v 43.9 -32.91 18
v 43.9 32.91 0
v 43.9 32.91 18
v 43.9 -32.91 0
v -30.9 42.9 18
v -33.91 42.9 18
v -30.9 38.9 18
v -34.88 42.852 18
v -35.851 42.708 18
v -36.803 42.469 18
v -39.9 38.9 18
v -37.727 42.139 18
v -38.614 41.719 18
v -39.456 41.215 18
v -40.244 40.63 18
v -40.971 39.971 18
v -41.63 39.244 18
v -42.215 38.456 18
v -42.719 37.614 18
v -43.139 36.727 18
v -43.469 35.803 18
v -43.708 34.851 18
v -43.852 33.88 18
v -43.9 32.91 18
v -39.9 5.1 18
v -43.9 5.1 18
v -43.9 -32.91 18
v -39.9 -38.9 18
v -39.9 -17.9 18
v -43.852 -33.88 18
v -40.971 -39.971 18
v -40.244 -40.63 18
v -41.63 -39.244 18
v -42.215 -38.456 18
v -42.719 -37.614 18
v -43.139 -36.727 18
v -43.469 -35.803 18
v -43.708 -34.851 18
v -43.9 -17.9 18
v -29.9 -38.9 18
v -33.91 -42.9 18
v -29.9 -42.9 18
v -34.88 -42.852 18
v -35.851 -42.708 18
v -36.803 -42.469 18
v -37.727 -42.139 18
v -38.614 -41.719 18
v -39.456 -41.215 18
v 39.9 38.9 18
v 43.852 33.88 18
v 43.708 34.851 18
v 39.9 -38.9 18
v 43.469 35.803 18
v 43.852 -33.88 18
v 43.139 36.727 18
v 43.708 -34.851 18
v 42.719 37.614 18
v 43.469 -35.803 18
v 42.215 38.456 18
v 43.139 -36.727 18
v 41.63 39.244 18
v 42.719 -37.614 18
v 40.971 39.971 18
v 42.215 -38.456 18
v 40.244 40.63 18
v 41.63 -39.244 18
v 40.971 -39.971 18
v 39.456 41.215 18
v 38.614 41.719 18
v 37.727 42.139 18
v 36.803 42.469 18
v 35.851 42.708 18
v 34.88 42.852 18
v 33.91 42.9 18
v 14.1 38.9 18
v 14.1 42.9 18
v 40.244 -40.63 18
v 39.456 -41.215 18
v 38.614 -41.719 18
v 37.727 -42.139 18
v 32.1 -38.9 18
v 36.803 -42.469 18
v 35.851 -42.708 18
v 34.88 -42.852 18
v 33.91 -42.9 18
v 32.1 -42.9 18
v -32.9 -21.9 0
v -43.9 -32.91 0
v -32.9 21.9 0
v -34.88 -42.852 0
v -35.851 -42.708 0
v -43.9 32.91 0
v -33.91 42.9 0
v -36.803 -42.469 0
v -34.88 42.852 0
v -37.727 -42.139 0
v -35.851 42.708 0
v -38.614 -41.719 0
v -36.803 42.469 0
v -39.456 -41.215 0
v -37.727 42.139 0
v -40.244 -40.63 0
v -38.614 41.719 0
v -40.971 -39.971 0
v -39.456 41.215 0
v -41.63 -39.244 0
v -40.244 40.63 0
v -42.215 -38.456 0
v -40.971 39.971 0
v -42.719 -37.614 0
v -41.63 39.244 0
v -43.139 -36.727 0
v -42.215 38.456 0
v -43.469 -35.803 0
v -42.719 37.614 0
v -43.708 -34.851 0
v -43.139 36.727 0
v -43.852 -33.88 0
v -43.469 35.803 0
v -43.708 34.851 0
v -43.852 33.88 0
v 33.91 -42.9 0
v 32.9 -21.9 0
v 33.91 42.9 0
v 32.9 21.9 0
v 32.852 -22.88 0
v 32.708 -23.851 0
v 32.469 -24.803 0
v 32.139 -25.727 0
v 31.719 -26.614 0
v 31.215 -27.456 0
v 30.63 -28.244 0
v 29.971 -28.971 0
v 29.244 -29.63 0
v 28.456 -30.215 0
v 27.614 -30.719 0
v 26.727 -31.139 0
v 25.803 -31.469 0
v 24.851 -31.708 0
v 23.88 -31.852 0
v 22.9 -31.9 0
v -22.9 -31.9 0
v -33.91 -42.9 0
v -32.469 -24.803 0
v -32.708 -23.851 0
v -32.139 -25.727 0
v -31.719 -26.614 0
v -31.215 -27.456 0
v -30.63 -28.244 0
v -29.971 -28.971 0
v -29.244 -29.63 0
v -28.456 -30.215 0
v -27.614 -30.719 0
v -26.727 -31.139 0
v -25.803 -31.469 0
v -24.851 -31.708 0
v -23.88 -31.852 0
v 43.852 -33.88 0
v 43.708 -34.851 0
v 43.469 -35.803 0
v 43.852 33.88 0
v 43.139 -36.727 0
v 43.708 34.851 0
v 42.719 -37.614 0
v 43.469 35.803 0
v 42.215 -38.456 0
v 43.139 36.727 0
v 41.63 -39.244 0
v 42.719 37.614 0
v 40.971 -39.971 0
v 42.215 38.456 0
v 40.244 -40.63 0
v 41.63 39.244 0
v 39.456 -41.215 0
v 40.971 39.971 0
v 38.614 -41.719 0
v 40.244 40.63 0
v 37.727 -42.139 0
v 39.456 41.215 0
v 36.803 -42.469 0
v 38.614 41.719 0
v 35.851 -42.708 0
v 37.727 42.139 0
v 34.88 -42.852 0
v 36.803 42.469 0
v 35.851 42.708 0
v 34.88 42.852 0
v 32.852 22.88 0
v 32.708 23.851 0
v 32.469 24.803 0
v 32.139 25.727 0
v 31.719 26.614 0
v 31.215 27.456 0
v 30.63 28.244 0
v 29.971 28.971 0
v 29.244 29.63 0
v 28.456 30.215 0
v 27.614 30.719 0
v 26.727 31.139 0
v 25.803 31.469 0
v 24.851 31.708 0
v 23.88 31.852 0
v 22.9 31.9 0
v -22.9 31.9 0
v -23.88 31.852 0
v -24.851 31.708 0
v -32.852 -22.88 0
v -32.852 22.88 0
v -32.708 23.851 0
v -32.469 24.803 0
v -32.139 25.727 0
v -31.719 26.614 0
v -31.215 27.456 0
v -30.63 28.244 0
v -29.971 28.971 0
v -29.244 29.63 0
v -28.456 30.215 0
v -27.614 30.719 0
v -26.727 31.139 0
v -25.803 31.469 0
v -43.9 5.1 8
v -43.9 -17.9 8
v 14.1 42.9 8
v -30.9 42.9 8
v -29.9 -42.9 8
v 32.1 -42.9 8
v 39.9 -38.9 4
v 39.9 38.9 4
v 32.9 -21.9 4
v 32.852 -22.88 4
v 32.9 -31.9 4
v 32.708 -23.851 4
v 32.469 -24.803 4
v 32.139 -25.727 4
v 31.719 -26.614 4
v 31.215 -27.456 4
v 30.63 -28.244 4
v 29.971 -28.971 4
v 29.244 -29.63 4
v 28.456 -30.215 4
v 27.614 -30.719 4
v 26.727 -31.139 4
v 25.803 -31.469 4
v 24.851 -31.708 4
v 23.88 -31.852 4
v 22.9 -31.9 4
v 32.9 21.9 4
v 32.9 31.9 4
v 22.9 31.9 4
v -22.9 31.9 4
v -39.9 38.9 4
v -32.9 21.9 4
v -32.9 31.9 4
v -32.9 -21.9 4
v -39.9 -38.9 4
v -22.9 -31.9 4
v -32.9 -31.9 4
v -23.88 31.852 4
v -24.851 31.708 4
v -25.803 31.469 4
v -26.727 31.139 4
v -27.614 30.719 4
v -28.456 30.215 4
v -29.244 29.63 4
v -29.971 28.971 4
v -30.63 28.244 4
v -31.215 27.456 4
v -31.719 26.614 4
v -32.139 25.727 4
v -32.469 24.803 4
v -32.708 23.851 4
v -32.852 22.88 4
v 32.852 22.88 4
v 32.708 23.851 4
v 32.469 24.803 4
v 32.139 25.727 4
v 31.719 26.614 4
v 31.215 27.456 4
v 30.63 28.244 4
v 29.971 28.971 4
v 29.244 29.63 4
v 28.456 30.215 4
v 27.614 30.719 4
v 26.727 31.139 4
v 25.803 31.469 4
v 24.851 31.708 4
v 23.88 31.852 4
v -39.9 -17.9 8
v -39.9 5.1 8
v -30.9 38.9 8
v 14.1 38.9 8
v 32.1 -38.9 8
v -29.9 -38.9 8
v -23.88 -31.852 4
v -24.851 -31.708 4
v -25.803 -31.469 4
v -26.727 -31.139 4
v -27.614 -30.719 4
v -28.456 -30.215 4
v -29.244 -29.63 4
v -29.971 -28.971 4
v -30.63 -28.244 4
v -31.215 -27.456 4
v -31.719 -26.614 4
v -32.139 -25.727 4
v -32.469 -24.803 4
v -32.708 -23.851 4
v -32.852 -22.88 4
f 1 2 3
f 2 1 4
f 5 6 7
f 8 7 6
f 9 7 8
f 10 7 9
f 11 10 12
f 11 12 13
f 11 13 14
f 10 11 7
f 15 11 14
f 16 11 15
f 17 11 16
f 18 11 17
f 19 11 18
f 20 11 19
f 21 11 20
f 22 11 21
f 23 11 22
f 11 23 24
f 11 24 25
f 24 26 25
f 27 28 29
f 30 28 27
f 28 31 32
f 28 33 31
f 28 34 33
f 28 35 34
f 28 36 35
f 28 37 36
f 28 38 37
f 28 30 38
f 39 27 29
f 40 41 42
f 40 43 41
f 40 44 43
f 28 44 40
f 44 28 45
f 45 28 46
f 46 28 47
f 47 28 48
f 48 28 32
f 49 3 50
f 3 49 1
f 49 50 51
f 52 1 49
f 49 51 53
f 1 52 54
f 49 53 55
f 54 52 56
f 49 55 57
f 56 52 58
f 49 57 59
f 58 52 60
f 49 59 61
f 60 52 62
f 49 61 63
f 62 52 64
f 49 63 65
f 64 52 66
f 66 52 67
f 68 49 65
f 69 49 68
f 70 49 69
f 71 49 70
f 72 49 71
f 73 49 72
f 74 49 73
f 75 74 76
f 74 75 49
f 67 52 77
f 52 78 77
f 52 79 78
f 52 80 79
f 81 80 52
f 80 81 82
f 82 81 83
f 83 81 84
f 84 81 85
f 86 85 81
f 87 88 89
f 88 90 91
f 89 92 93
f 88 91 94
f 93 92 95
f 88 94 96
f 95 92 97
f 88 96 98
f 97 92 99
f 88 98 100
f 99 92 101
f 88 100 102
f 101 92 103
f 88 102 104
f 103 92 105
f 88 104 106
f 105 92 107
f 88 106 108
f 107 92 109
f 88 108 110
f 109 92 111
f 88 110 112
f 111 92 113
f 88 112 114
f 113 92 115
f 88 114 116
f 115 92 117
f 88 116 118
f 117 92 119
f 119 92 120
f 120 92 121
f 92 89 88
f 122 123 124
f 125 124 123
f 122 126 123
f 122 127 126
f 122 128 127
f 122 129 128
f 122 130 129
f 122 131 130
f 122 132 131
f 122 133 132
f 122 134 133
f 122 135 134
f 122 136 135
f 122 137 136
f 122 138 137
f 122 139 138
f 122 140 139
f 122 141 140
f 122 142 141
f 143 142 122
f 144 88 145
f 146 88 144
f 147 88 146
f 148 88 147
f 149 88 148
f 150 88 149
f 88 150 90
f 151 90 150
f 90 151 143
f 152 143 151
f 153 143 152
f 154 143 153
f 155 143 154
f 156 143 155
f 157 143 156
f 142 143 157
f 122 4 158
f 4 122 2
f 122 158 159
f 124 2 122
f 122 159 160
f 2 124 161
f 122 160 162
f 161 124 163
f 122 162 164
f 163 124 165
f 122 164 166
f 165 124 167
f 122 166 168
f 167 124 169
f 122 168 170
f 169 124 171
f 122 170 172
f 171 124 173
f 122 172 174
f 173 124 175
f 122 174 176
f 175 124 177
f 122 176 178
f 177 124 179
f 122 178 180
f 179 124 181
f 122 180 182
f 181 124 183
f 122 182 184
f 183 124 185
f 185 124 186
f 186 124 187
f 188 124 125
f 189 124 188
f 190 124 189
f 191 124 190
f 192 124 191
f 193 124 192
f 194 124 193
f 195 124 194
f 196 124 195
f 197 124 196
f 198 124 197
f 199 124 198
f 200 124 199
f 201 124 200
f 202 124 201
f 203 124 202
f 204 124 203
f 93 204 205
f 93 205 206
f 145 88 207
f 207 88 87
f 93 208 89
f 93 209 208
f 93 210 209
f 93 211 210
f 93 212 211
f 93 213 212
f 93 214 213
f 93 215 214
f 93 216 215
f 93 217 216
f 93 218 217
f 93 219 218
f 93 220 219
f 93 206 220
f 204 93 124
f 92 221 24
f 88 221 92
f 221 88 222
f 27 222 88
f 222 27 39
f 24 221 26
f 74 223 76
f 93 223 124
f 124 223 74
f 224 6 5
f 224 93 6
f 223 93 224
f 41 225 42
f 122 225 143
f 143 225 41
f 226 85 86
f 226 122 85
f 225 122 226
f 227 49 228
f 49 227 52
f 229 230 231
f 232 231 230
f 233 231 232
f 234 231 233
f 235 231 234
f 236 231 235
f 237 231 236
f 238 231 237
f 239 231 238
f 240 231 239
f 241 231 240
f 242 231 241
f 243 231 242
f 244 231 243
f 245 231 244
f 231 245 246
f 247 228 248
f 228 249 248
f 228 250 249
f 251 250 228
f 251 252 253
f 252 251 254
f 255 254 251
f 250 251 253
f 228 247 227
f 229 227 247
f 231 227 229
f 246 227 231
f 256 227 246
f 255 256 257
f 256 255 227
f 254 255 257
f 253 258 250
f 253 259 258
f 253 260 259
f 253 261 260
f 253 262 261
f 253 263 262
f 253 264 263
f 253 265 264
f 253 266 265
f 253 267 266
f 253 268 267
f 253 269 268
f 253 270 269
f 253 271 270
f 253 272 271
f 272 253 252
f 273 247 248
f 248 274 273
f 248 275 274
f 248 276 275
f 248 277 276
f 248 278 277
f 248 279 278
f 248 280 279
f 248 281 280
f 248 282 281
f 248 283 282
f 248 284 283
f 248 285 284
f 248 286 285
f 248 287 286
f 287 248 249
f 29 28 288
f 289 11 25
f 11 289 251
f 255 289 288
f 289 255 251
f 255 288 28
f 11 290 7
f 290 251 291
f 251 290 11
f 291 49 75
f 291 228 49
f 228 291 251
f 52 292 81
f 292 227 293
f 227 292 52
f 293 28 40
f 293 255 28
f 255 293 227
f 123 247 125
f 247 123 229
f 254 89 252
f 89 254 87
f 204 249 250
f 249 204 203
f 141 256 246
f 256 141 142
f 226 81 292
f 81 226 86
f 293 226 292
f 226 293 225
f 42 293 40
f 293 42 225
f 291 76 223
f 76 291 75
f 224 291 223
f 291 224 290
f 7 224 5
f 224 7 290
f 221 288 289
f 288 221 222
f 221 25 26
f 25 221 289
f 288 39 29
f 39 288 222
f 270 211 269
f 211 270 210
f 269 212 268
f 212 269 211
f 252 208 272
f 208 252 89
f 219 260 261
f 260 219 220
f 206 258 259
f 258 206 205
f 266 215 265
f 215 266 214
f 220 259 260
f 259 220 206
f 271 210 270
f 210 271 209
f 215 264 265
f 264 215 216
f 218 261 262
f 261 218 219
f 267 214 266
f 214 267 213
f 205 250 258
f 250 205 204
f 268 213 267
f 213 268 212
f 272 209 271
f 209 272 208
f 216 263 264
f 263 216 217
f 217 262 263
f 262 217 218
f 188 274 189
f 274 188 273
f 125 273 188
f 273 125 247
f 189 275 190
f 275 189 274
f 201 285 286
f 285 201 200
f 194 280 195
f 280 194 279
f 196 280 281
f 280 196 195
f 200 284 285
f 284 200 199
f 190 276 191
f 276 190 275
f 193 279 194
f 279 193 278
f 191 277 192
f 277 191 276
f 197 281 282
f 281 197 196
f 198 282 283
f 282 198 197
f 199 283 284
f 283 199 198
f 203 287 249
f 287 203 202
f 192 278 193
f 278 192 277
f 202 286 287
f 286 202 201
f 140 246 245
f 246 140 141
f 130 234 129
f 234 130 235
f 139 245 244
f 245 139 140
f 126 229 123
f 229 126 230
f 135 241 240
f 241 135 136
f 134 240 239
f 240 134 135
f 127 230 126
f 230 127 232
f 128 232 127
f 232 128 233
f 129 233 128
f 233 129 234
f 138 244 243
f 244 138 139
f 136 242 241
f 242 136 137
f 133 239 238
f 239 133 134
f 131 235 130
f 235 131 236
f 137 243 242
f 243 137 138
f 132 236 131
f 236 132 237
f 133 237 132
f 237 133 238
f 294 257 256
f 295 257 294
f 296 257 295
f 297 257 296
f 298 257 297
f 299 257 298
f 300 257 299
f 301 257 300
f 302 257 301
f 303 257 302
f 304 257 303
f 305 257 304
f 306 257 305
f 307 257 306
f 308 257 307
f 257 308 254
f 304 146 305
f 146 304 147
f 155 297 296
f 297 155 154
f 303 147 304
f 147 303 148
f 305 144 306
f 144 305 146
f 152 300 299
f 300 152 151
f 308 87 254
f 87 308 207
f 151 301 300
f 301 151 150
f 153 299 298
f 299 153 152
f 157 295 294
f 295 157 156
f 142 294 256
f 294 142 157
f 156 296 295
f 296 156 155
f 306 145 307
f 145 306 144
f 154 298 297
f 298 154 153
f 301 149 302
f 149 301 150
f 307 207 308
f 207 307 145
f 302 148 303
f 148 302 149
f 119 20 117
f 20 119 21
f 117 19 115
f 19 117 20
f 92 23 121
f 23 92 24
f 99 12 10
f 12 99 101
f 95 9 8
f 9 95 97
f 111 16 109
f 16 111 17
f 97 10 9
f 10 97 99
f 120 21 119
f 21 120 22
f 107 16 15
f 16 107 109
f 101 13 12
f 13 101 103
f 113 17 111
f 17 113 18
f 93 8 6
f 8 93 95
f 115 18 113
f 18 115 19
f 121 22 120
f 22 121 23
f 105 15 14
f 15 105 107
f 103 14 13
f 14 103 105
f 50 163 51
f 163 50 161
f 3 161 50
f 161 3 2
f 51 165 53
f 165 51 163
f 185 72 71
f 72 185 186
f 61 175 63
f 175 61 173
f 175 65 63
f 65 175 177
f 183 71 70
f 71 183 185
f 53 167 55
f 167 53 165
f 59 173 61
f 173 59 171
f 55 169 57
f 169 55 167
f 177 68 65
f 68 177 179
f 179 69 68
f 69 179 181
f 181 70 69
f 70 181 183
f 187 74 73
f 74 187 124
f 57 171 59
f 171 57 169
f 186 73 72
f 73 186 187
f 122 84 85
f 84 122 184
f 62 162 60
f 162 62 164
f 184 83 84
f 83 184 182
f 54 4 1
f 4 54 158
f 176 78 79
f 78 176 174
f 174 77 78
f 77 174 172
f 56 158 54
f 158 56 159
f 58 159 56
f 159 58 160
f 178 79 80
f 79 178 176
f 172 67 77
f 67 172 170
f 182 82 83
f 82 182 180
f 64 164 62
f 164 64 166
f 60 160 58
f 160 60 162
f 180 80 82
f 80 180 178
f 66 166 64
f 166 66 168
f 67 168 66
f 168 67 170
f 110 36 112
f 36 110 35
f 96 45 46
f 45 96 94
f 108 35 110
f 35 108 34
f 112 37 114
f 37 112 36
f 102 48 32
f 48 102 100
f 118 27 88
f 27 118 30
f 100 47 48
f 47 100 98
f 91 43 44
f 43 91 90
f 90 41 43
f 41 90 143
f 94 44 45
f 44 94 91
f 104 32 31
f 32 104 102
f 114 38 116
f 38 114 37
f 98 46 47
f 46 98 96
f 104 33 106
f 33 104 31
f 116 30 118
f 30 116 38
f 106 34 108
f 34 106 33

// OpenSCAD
// Box for beagleboard, (c) 2010 - Koen Kooi, licensed under CC-BY-SA

// lenght of PCB
inside_length = 77.8;

// width of PCB
inside_w = 79.8;

// outside wall thickness
edge_thickness = 4;

// Set this to zero have a 'coaster' instead of a box
extra_height = 10;

// stud is inside the wall but aligned to the bottom, 
// so its stud_size x stud_size x (stud_height - edge_thickness) big
stud_size = 7;
stud_height = 6;
pcb_thickness = 2;

// Round the inside and outside corners
use_rounded_corners = 1; // 0,1

inside_corner_radius = 10;
corner_radius = 10;


box_width = inside_w + (edge_thickness * 2); 
box_length = inside_length + (edge_thickness * 2);
box_height = stud_height + pcb_thickness + extra_height;

translate(v = [ -box_width / 2, -box_length / 2, 0]) {   
  if(use_rounded_corners == 1) {
    roundedbox(box_width, box_length, box_height, edge_thickness, stud_size);
  } else {
    plainbox(box_width, box_length, box_height, edge_thickness, stud_size);
  }
}

module plainbox(box_width, box_length, box_height, edge_thickness, stud_size) {
  difference() {
    //outside
    cube([box_width, box_length, box_height]);
    //inside
    translate(v = [edge_thickness, edge_thickness, edge_thickness]) {  
      cube([inside_w, inside_length, box_height]);
    }
    translate(v = [stud_size + edge_thickness, stud_size + edge_thickness, -edge_thickness]) {  
      cube([inside_w - 2 * stud_size, inside_length - 2 * stud_size, box_height]);
    }
    //audio: 62mm long, 10mm corner offset
    translate(v = [10 + edge_thickness, -0.01, stud_height + pcb_thickness]) {
      cube([62, edge_thickness + 0.02, extra_height + 0.01], center=false);
    }
    //sd: 45mm long, 9mm corner offset
    translate(v = [9 + edge_thickness, box_length - edge_thickness - 0.01, stud_height + pcb_thickness]) {
      cube([45, edge_thickness + 0.02, extra_height + 0.01], center=false);
    }
    //power: 23mm long, 21mm corner offset
    translate(v = [-0.01, 21 + edge_thickness, stud_height + pcb_thickness]) {
      cube([edge_thickness + 0.02, 23, extra_height + 0.01], center=false);
    }
  }
}

module roundedbox(box_width, box_length, box_height, edge_thickness, stud_size) {
  difference() {
    union() {
      plainbox(box_width, box_length, box_height, edge_thickness, stud_size);
  
        //rounded corner topleft
        translate(v = [edge_thickness + stud_size, box_length - edge_thickness - stud_size, 0]) {
          difference() {
            translate(v=[0,-inside_corner_radius,0]) {
              cube([inside_corner_radius,inside_corner_radius,edge_thickness]);
            }
            translate(v=[inside_corner_radius, -inside_corner_radius, -edge_thickness]) {
              cylinder(r=inside_corner_radius, h=3*edge_thickness, $fn=64);
            }
          }
        }
        //rounded corner topright
        translate(v = [box_width - edge_thickness - stud_size, box_length - edge_thickness - stud_size, 0]) {
          difference() {
            translate(v=[-inside_corner_radius,-inside_corner_radius,0]) {
              cube([inside_corner_radius,inside_corner_radius,edge_thickness]);
            }
            translate(v=[-inside_corner_radius, -inside_corner_radius, -edge_thickness]) {
              cylinder(r=inside_corner_radius, h=3*edge_thickness, $fn=64);
            }
          }
        }
        //rounded corner bottomright
        translate(v = [box_width - edge_thickness - stud_size, edge_thickness + stud_size, 0]) {
          difference() {
            translate(v=[-inside_corner_radius,0,0]) {
              cube([inside_corner_radius,inside_corner_radius,edge_thickness]);
            }
            translate(v=[-inside_corner_radius, inside_corner_radius, -edge_thickness]) {
              cylinder(r=inside_corner_radius, h=3*edge_thickness, $fn=64);
            }
          }
        }
        //rounded corner bottomleft
        translate(v = [edge_thickness + stud_size, edge_thickness + stud_size, 0]) {
          difference() {
            translate(v=[0,0,0]) {
              cube([inside_corner_radius,inside_corner_radius,edge_thickness]);
            }
            translate(v=[inside_corner_radius, inside_corner_radius, -edge_thickness]) {
              cylinder(r=inside_corner_radius, h=3*edge_thickness, $fn=64);
            }
          }
        }
    } //end union

    //rounded corner topleft
    translate(v = [0, box_length, 0]) {
      difference() {
        translate(v=[0 - 0.01,-corner_radius + 0.01, -0.5 * box_height]) {
          cube([corner_radius,corner_radius,2*box_height]);
        }
        translate(v=[corner_radius, -corner_radius, -0.5 * box_height]) {
          cylinder(r=corner_radius, h=2*box_height, $fn=64);
        }
      }
    }
    //rounded corner topright
    translate(v = [box_width, box_length, 0]) {
      difference() {
        translate(v=[-corner_radius + 0.01,-corner_radius + 0.01, -0.5 * box_height]) {
          cube([corner_radius,corner_radius,2*box_height]);
        }
        translate(v=[-corner_radius, -corner_radius, -0.5 * box_height]) {
          cylinder(r=corner_radius, h=2*box_height, $fn=64);
        }
      }
    }
    //rounded corner bottomright
    translate(v = [box_width, 0, 0]) {
      difference() {
        translate(v=[-corner_radius + 0.01,0 - 0.01, -0.5 * box_height]) {
          cube([corner_radius,corner_radius,2*box_height]);
        }
        translate(v=[-corner_radius, corner_radius, -0.5 * box_height]) {
          cylinder(r=corner_radius, h=2*box_height, $fn=64);
        }
      }
    }
    //rounded corner bottomleft
    translate(v = [0, 0, 0]) {
      difference() {
        translate(v=[0-0.01, -0.01, -0.5 * box_height]) {
          cube([corner_radius ,corner_radius,2*box_height]);
        }
        translate(v=[corner_radius, corner_radius, -0.5 * box_height]) {
          cylinder(r=corner_radius, h=2*box_height, $fn=64);
        }
      }
    }
  } //end difference
}
